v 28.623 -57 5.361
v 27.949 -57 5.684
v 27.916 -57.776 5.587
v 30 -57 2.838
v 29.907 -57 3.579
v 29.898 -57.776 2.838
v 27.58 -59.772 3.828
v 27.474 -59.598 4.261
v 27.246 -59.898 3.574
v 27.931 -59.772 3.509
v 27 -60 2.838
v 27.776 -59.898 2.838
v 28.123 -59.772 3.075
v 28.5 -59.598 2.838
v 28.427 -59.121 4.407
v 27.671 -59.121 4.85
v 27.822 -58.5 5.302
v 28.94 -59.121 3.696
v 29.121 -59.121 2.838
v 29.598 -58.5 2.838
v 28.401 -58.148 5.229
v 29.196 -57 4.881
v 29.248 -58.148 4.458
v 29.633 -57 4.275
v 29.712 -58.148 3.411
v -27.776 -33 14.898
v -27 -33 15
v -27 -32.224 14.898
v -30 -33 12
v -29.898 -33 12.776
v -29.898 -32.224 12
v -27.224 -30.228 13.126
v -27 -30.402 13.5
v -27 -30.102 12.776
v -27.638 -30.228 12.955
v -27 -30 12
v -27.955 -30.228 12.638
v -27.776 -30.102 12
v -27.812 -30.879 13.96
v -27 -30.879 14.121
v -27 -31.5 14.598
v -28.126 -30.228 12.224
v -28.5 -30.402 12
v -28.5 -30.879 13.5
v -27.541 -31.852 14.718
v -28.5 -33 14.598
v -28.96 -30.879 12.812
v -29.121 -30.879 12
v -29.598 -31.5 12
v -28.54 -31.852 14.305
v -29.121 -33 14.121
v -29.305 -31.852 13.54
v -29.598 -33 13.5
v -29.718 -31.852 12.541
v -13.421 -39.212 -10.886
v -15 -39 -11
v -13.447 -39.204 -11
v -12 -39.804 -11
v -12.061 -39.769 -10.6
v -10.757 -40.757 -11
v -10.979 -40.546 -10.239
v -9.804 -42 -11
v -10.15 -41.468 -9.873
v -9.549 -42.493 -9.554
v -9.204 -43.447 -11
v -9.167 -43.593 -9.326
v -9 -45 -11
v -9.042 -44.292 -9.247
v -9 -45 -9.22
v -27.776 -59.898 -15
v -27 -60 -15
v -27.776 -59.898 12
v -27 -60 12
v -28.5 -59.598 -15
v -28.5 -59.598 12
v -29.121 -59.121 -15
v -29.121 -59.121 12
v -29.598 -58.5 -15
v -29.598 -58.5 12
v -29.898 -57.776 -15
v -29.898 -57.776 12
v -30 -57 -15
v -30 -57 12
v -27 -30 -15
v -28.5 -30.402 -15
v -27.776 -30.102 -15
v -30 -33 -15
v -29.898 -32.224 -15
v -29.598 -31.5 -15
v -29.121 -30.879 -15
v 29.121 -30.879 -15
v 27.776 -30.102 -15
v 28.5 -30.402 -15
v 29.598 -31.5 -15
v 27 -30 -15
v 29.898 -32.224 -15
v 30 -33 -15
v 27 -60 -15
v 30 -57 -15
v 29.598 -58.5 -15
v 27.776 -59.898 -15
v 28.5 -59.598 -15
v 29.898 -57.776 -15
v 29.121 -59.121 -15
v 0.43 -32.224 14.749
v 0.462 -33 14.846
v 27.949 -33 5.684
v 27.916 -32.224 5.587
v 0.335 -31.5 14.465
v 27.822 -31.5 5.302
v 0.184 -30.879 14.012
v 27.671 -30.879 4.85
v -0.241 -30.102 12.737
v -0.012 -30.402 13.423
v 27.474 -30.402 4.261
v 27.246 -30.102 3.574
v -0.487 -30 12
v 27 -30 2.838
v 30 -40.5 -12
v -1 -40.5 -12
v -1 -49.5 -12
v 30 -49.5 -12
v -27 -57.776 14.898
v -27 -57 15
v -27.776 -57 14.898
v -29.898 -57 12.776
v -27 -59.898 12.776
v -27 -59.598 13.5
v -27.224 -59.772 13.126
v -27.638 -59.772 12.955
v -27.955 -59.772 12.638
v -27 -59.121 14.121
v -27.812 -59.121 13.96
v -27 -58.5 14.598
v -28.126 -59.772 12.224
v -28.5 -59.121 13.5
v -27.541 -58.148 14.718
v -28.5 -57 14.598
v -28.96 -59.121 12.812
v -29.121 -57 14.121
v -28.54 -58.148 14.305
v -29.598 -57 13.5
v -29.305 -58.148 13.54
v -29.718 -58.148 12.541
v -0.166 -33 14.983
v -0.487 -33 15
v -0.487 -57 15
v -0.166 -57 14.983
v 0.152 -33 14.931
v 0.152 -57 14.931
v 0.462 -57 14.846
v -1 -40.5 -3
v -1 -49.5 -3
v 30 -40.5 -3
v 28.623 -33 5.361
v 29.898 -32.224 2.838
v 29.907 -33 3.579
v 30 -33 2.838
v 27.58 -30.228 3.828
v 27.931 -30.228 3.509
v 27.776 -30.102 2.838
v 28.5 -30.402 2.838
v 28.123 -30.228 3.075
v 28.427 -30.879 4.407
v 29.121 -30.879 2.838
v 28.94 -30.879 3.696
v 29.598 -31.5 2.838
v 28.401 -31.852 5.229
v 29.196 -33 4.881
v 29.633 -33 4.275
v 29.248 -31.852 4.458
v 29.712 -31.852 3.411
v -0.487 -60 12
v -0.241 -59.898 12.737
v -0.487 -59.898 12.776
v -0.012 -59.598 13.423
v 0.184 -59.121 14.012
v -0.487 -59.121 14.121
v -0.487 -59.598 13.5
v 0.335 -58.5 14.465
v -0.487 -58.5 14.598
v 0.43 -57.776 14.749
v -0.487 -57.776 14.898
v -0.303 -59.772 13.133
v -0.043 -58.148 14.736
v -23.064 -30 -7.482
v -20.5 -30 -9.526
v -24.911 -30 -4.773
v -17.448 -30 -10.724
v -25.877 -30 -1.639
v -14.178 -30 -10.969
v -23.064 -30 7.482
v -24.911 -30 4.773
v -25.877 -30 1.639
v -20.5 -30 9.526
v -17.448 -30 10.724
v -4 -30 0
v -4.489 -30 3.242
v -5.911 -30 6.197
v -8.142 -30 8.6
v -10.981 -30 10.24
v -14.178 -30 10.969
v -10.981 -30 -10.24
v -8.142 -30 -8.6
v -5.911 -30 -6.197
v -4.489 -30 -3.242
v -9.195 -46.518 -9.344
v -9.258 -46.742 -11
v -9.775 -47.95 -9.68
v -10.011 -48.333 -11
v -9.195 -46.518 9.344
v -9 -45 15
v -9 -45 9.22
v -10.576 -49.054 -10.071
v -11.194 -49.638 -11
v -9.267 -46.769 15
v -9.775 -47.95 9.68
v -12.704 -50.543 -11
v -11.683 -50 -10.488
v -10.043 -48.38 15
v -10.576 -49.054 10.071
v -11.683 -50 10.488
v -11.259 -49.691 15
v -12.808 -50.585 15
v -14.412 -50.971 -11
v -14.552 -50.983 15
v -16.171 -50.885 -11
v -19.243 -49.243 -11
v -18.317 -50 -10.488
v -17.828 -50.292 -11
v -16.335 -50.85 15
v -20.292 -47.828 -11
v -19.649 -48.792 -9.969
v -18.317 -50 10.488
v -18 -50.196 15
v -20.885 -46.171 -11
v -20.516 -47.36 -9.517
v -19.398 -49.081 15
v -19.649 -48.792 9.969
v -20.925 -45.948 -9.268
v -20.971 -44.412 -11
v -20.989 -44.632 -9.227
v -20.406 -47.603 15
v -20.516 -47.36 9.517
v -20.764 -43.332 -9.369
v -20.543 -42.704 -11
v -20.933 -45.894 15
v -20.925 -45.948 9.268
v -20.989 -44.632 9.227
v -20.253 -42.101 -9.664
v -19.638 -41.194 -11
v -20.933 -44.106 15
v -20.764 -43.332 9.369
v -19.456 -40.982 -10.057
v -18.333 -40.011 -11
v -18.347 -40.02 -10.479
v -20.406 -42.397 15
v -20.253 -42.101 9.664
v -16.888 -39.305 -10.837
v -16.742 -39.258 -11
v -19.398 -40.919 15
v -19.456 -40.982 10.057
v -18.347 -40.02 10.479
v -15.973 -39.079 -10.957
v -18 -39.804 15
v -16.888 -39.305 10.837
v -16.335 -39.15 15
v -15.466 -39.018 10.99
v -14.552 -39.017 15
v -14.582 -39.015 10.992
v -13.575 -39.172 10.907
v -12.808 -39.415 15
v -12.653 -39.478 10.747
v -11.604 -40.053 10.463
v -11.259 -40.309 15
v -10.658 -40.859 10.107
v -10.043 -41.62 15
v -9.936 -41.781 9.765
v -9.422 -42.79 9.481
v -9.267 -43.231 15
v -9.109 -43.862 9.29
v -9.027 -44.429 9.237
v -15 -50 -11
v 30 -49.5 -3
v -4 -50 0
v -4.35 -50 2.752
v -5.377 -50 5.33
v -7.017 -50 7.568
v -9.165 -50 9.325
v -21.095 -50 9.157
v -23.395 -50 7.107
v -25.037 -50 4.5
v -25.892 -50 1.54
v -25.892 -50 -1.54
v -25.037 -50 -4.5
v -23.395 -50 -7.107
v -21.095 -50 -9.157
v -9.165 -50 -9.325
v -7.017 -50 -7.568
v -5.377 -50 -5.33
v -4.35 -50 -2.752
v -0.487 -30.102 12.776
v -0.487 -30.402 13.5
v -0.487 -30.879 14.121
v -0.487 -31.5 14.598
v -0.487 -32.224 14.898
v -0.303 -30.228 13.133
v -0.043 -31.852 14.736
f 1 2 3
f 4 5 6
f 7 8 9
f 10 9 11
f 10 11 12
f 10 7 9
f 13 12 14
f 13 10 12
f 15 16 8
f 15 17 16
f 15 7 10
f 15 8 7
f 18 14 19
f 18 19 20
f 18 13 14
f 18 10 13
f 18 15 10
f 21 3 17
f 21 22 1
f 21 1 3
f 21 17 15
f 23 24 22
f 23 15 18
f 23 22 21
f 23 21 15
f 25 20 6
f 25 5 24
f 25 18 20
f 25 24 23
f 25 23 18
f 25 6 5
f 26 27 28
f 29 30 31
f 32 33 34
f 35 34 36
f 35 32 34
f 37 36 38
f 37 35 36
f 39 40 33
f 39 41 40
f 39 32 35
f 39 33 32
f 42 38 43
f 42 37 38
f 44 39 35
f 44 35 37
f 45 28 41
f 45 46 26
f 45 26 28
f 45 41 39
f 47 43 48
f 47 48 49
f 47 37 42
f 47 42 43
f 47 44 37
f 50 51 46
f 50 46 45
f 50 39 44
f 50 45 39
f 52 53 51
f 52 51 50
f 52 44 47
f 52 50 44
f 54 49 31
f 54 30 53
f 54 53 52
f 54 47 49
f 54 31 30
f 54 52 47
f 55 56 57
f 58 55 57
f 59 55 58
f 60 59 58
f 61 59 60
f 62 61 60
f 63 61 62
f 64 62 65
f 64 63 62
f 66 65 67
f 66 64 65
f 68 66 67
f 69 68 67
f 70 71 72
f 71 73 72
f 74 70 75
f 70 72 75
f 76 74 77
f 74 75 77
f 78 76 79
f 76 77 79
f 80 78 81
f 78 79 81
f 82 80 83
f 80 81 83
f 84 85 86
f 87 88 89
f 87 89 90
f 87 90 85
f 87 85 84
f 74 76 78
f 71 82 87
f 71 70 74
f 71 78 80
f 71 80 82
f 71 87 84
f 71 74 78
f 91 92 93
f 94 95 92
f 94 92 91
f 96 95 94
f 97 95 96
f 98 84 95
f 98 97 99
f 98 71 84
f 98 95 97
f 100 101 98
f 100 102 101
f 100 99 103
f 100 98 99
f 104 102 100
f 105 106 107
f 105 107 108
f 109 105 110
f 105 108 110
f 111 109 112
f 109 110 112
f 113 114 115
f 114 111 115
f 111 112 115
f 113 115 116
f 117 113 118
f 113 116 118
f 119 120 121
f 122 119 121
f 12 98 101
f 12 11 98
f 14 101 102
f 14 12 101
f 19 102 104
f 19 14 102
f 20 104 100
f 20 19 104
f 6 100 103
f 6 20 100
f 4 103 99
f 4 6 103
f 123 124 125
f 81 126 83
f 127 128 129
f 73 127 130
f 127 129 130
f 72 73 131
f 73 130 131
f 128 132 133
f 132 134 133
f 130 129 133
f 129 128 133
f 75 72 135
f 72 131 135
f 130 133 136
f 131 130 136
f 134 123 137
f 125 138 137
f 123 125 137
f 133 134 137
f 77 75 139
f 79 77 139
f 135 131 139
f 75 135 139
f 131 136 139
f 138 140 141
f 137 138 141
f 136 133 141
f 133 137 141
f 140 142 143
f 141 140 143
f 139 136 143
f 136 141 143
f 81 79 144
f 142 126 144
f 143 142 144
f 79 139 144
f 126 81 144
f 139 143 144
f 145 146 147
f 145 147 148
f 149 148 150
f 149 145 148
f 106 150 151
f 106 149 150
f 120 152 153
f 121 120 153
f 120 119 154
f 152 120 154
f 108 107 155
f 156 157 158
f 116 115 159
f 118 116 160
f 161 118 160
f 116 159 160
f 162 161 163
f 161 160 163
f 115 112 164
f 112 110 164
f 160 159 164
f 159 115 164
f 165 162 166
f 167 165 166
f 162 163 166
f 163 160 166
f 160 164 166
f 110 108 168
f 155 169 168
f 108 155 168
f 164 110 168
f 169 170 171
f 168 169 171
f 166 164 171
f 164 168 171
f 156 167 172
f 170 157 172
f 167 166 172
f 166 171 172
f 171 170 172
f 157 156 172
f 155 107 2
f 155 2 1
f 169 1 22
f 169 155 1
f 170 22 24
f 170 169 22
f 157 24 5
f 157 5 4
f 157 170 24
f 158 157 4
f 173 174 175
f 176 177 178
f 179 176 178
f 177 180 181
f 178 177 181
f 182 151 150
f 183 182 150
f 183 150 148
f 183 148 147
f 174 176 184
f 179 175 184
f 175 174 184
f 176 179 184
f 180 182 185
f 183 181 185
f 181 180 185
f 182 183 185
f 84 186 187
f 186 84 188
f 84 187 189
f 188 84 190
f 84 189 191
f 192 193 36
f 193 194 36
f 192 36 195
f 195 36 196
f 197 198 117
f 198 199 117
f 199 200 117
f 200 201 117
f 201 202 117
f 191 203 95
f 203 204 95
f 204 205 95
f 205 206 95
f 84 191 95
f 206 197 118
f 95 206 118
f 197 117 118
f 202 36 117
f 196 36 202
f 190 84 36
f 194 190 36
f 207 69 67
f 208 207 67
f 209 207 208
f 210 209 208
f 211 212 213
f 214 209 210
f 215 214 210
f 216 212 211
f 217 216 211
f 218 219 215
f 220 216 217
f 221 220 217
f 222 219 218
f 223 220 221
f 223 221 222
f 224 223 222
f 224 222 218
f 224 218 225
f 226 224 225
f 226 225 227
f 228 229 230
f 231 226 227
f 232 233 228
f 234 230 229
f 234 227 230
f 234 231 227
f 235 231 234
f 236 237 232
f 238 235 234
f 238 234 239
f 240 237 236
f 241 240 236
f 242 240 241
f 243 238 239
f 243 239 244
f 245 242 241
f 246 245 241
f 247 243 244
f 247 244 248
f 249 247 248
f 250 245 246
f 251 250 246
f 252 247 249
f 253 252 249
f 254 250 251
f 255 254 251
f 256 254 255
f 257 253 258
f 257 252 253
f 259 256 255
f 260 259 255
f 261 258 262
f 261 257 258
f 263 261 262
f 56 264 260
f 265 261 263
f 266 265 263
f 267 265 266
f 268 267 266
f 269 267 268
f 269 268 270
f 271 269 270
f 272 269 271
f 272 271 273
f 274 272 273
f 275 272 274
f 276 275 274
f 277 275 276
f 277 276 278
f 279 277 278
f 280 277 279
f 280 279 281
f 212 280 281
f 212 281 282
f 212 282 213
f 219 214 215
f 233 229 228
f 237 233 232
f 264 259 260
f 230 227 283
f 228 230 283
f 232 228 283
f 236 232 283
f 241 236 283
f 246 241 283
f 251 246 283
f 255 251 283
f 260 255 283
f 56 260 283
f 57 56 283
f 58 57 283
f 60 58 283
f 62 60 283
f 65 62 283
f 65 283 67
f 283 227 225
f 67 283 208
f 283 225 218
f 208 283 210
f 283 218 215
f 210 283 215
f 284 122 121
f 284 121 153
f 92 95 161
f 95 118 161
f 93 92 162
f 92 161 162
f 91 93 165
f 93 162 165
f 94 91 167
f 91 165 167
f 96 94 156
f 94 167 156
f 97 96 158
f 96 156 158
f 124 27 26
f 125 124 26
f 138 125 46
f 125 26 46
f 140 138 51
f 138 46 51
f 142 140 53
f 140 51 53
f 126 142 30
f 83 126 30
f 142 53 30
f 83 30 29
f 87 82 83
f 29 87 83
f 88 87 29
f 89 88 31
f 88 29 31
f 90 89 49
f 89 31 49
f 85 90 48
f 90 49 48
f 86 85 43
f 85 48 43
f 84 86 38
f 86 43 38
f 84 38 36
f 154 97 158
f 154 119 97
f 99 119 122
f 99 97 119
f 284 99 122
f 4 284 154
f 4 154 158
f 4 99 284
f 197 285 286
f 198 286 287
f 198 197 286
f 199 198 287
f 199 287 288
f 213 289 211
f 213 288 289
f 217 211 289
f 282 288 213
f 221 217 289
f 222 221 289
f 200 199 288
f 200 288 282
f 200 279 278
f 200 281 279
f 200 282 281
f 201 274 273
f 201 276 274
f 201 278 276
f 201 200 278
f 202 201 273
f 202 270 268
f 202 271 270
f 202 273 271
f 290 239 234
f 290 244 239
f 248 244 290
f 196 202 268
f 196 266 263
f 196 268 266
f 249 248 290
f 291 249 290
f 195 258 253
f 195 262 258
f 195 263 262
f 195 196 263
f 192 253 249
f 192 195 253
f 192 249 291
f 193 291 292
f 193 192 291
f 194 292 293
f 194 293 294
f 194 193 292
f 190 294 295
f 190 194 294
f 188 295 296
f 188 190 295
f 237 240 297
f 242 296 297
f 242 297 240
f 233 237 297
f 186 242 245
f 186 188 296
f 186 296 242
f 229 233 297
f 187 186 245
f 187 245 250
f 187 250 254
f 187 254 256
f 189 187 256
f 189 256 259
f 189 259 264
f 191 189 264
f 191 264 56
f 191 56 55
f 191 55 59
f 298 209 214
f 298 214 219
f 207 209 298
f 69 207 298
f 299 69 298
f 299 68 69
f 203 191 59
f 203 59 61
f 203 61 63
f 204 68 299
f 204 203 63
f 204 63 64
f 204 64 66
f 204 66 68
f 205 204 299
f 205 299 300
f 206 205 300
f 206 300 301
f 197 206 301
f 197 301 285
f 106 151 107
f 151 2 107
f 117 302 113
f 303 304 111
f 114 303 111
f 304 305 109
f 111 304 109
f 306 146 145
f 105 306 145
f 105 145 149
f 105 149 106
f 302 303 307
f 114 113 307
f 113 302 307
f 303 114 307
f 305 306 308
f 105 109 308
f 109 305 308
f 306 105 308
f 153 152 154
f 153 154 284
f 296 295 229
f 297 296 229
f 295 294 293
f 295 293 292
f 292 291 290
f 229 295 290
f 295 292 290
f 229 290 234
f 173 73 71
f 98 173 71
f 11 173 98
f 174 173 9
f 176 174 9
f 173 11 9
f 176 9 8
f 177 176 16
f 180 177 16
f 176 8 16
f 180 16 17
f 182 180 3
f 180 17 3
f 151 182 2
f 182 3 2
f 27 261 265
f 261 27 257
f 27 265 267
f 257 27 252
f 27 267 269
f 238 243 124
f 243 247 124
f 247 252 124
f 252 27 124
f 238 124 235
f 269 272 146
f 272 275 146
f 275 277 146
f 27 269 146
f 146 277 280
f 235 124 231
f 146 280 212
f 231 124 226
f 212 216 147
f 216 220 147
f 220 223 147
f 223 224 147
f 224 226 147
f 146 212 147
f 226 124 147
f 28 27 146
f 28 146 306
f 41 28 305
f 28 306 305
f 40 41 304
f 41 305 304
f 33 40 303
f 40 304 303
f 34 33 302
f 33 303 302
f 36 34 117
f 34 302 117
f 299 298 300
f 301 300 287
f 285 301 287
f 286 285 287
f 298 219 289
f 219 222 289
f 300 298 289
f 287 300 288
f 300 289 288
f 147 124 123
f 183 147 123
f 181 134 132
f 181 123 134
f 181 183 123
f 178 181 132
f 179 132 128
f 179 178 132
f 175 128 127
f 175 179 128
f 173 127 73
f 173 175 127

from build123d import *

# Parameters (mm, degrees)
F0_W     = 60
F0_H     = 30
F1_DEPTH = 30
F2_R     = 11
F3_DEPTH = 20
F4_W     = 9
F4_H     = 9
F5_DEPTH = 31
F6_R     = 6
F7_DEPTH = 26
F8_SIZE2 = 10
F8_SIZE  = 30
F9_R     = 3


with BuildPart() as f1:
    # F0 (on Front) → F1 (new body)
    with BuildSketch(Plane.XZ):
        Rectangle(F0_W, F0_H)
    extrude(amount=F1_DEPTH)

    # F2 (on face) → F3 (cut)
    with BuildSketch(Plane.XZ.offset(30)):
        with Locations((-15, 0)):
            Circle(F2_R)
    extrude(amount=-F3_DEPTH, mode=Mode.SUBTRACT)

    # F4 (on face) → F5 (cut)
    with BuildSketch(Plane.YZ.offset(30)):
        with Locations((-15, -7.5)):
            Rectangle(F4_W, F4_H)
    extrude(amount=-F5_DEPTH, mode=Mode.SUBTRACT)

    # F6 (on face) → F7 (cut)
    with BuildSketch(Plane.XY.offset(15)):
        with Locations((-15, -15)):
            Circle(F6_R)
    extrude(amount=-F7_DEPTH, mode=Mode.SUBTRACT)

    # F8
    f8_edges = [f1.edges().sort_by_distance(p)[0] for p in [
        (30, -15, 15),
    ]]
    f8_side = f1.faces().sort_by_distance((1.005666, -15, 15))[0]
    chamfer(f8_edges, length=F8_SIZE, length2=F8_SIZE2, reference=f8_side)

    # F9
    f9_edges = [f1.edges().sort_by_distance(p)[0] for p in [
        (-30, -15, 15),
        (-15, 0, 15),
        (0, -15, 15),
        (30, -15, 5),
        (-15, -30, 15),
        (15, -30, 10),
        (15, 0, 10),
        (30, -30, -5),
        (30, 0, -5),
        (-30, 0, 0),
        (-30, -30, 0),
    ]]
    fillet(f9_edges, radius=F9_R)


with BuildPart() as f10_1:
    # F10: instance of F1
    add(f1.part.mirror(Plane.XZ.offset(30)))


solid = f10_1.part
